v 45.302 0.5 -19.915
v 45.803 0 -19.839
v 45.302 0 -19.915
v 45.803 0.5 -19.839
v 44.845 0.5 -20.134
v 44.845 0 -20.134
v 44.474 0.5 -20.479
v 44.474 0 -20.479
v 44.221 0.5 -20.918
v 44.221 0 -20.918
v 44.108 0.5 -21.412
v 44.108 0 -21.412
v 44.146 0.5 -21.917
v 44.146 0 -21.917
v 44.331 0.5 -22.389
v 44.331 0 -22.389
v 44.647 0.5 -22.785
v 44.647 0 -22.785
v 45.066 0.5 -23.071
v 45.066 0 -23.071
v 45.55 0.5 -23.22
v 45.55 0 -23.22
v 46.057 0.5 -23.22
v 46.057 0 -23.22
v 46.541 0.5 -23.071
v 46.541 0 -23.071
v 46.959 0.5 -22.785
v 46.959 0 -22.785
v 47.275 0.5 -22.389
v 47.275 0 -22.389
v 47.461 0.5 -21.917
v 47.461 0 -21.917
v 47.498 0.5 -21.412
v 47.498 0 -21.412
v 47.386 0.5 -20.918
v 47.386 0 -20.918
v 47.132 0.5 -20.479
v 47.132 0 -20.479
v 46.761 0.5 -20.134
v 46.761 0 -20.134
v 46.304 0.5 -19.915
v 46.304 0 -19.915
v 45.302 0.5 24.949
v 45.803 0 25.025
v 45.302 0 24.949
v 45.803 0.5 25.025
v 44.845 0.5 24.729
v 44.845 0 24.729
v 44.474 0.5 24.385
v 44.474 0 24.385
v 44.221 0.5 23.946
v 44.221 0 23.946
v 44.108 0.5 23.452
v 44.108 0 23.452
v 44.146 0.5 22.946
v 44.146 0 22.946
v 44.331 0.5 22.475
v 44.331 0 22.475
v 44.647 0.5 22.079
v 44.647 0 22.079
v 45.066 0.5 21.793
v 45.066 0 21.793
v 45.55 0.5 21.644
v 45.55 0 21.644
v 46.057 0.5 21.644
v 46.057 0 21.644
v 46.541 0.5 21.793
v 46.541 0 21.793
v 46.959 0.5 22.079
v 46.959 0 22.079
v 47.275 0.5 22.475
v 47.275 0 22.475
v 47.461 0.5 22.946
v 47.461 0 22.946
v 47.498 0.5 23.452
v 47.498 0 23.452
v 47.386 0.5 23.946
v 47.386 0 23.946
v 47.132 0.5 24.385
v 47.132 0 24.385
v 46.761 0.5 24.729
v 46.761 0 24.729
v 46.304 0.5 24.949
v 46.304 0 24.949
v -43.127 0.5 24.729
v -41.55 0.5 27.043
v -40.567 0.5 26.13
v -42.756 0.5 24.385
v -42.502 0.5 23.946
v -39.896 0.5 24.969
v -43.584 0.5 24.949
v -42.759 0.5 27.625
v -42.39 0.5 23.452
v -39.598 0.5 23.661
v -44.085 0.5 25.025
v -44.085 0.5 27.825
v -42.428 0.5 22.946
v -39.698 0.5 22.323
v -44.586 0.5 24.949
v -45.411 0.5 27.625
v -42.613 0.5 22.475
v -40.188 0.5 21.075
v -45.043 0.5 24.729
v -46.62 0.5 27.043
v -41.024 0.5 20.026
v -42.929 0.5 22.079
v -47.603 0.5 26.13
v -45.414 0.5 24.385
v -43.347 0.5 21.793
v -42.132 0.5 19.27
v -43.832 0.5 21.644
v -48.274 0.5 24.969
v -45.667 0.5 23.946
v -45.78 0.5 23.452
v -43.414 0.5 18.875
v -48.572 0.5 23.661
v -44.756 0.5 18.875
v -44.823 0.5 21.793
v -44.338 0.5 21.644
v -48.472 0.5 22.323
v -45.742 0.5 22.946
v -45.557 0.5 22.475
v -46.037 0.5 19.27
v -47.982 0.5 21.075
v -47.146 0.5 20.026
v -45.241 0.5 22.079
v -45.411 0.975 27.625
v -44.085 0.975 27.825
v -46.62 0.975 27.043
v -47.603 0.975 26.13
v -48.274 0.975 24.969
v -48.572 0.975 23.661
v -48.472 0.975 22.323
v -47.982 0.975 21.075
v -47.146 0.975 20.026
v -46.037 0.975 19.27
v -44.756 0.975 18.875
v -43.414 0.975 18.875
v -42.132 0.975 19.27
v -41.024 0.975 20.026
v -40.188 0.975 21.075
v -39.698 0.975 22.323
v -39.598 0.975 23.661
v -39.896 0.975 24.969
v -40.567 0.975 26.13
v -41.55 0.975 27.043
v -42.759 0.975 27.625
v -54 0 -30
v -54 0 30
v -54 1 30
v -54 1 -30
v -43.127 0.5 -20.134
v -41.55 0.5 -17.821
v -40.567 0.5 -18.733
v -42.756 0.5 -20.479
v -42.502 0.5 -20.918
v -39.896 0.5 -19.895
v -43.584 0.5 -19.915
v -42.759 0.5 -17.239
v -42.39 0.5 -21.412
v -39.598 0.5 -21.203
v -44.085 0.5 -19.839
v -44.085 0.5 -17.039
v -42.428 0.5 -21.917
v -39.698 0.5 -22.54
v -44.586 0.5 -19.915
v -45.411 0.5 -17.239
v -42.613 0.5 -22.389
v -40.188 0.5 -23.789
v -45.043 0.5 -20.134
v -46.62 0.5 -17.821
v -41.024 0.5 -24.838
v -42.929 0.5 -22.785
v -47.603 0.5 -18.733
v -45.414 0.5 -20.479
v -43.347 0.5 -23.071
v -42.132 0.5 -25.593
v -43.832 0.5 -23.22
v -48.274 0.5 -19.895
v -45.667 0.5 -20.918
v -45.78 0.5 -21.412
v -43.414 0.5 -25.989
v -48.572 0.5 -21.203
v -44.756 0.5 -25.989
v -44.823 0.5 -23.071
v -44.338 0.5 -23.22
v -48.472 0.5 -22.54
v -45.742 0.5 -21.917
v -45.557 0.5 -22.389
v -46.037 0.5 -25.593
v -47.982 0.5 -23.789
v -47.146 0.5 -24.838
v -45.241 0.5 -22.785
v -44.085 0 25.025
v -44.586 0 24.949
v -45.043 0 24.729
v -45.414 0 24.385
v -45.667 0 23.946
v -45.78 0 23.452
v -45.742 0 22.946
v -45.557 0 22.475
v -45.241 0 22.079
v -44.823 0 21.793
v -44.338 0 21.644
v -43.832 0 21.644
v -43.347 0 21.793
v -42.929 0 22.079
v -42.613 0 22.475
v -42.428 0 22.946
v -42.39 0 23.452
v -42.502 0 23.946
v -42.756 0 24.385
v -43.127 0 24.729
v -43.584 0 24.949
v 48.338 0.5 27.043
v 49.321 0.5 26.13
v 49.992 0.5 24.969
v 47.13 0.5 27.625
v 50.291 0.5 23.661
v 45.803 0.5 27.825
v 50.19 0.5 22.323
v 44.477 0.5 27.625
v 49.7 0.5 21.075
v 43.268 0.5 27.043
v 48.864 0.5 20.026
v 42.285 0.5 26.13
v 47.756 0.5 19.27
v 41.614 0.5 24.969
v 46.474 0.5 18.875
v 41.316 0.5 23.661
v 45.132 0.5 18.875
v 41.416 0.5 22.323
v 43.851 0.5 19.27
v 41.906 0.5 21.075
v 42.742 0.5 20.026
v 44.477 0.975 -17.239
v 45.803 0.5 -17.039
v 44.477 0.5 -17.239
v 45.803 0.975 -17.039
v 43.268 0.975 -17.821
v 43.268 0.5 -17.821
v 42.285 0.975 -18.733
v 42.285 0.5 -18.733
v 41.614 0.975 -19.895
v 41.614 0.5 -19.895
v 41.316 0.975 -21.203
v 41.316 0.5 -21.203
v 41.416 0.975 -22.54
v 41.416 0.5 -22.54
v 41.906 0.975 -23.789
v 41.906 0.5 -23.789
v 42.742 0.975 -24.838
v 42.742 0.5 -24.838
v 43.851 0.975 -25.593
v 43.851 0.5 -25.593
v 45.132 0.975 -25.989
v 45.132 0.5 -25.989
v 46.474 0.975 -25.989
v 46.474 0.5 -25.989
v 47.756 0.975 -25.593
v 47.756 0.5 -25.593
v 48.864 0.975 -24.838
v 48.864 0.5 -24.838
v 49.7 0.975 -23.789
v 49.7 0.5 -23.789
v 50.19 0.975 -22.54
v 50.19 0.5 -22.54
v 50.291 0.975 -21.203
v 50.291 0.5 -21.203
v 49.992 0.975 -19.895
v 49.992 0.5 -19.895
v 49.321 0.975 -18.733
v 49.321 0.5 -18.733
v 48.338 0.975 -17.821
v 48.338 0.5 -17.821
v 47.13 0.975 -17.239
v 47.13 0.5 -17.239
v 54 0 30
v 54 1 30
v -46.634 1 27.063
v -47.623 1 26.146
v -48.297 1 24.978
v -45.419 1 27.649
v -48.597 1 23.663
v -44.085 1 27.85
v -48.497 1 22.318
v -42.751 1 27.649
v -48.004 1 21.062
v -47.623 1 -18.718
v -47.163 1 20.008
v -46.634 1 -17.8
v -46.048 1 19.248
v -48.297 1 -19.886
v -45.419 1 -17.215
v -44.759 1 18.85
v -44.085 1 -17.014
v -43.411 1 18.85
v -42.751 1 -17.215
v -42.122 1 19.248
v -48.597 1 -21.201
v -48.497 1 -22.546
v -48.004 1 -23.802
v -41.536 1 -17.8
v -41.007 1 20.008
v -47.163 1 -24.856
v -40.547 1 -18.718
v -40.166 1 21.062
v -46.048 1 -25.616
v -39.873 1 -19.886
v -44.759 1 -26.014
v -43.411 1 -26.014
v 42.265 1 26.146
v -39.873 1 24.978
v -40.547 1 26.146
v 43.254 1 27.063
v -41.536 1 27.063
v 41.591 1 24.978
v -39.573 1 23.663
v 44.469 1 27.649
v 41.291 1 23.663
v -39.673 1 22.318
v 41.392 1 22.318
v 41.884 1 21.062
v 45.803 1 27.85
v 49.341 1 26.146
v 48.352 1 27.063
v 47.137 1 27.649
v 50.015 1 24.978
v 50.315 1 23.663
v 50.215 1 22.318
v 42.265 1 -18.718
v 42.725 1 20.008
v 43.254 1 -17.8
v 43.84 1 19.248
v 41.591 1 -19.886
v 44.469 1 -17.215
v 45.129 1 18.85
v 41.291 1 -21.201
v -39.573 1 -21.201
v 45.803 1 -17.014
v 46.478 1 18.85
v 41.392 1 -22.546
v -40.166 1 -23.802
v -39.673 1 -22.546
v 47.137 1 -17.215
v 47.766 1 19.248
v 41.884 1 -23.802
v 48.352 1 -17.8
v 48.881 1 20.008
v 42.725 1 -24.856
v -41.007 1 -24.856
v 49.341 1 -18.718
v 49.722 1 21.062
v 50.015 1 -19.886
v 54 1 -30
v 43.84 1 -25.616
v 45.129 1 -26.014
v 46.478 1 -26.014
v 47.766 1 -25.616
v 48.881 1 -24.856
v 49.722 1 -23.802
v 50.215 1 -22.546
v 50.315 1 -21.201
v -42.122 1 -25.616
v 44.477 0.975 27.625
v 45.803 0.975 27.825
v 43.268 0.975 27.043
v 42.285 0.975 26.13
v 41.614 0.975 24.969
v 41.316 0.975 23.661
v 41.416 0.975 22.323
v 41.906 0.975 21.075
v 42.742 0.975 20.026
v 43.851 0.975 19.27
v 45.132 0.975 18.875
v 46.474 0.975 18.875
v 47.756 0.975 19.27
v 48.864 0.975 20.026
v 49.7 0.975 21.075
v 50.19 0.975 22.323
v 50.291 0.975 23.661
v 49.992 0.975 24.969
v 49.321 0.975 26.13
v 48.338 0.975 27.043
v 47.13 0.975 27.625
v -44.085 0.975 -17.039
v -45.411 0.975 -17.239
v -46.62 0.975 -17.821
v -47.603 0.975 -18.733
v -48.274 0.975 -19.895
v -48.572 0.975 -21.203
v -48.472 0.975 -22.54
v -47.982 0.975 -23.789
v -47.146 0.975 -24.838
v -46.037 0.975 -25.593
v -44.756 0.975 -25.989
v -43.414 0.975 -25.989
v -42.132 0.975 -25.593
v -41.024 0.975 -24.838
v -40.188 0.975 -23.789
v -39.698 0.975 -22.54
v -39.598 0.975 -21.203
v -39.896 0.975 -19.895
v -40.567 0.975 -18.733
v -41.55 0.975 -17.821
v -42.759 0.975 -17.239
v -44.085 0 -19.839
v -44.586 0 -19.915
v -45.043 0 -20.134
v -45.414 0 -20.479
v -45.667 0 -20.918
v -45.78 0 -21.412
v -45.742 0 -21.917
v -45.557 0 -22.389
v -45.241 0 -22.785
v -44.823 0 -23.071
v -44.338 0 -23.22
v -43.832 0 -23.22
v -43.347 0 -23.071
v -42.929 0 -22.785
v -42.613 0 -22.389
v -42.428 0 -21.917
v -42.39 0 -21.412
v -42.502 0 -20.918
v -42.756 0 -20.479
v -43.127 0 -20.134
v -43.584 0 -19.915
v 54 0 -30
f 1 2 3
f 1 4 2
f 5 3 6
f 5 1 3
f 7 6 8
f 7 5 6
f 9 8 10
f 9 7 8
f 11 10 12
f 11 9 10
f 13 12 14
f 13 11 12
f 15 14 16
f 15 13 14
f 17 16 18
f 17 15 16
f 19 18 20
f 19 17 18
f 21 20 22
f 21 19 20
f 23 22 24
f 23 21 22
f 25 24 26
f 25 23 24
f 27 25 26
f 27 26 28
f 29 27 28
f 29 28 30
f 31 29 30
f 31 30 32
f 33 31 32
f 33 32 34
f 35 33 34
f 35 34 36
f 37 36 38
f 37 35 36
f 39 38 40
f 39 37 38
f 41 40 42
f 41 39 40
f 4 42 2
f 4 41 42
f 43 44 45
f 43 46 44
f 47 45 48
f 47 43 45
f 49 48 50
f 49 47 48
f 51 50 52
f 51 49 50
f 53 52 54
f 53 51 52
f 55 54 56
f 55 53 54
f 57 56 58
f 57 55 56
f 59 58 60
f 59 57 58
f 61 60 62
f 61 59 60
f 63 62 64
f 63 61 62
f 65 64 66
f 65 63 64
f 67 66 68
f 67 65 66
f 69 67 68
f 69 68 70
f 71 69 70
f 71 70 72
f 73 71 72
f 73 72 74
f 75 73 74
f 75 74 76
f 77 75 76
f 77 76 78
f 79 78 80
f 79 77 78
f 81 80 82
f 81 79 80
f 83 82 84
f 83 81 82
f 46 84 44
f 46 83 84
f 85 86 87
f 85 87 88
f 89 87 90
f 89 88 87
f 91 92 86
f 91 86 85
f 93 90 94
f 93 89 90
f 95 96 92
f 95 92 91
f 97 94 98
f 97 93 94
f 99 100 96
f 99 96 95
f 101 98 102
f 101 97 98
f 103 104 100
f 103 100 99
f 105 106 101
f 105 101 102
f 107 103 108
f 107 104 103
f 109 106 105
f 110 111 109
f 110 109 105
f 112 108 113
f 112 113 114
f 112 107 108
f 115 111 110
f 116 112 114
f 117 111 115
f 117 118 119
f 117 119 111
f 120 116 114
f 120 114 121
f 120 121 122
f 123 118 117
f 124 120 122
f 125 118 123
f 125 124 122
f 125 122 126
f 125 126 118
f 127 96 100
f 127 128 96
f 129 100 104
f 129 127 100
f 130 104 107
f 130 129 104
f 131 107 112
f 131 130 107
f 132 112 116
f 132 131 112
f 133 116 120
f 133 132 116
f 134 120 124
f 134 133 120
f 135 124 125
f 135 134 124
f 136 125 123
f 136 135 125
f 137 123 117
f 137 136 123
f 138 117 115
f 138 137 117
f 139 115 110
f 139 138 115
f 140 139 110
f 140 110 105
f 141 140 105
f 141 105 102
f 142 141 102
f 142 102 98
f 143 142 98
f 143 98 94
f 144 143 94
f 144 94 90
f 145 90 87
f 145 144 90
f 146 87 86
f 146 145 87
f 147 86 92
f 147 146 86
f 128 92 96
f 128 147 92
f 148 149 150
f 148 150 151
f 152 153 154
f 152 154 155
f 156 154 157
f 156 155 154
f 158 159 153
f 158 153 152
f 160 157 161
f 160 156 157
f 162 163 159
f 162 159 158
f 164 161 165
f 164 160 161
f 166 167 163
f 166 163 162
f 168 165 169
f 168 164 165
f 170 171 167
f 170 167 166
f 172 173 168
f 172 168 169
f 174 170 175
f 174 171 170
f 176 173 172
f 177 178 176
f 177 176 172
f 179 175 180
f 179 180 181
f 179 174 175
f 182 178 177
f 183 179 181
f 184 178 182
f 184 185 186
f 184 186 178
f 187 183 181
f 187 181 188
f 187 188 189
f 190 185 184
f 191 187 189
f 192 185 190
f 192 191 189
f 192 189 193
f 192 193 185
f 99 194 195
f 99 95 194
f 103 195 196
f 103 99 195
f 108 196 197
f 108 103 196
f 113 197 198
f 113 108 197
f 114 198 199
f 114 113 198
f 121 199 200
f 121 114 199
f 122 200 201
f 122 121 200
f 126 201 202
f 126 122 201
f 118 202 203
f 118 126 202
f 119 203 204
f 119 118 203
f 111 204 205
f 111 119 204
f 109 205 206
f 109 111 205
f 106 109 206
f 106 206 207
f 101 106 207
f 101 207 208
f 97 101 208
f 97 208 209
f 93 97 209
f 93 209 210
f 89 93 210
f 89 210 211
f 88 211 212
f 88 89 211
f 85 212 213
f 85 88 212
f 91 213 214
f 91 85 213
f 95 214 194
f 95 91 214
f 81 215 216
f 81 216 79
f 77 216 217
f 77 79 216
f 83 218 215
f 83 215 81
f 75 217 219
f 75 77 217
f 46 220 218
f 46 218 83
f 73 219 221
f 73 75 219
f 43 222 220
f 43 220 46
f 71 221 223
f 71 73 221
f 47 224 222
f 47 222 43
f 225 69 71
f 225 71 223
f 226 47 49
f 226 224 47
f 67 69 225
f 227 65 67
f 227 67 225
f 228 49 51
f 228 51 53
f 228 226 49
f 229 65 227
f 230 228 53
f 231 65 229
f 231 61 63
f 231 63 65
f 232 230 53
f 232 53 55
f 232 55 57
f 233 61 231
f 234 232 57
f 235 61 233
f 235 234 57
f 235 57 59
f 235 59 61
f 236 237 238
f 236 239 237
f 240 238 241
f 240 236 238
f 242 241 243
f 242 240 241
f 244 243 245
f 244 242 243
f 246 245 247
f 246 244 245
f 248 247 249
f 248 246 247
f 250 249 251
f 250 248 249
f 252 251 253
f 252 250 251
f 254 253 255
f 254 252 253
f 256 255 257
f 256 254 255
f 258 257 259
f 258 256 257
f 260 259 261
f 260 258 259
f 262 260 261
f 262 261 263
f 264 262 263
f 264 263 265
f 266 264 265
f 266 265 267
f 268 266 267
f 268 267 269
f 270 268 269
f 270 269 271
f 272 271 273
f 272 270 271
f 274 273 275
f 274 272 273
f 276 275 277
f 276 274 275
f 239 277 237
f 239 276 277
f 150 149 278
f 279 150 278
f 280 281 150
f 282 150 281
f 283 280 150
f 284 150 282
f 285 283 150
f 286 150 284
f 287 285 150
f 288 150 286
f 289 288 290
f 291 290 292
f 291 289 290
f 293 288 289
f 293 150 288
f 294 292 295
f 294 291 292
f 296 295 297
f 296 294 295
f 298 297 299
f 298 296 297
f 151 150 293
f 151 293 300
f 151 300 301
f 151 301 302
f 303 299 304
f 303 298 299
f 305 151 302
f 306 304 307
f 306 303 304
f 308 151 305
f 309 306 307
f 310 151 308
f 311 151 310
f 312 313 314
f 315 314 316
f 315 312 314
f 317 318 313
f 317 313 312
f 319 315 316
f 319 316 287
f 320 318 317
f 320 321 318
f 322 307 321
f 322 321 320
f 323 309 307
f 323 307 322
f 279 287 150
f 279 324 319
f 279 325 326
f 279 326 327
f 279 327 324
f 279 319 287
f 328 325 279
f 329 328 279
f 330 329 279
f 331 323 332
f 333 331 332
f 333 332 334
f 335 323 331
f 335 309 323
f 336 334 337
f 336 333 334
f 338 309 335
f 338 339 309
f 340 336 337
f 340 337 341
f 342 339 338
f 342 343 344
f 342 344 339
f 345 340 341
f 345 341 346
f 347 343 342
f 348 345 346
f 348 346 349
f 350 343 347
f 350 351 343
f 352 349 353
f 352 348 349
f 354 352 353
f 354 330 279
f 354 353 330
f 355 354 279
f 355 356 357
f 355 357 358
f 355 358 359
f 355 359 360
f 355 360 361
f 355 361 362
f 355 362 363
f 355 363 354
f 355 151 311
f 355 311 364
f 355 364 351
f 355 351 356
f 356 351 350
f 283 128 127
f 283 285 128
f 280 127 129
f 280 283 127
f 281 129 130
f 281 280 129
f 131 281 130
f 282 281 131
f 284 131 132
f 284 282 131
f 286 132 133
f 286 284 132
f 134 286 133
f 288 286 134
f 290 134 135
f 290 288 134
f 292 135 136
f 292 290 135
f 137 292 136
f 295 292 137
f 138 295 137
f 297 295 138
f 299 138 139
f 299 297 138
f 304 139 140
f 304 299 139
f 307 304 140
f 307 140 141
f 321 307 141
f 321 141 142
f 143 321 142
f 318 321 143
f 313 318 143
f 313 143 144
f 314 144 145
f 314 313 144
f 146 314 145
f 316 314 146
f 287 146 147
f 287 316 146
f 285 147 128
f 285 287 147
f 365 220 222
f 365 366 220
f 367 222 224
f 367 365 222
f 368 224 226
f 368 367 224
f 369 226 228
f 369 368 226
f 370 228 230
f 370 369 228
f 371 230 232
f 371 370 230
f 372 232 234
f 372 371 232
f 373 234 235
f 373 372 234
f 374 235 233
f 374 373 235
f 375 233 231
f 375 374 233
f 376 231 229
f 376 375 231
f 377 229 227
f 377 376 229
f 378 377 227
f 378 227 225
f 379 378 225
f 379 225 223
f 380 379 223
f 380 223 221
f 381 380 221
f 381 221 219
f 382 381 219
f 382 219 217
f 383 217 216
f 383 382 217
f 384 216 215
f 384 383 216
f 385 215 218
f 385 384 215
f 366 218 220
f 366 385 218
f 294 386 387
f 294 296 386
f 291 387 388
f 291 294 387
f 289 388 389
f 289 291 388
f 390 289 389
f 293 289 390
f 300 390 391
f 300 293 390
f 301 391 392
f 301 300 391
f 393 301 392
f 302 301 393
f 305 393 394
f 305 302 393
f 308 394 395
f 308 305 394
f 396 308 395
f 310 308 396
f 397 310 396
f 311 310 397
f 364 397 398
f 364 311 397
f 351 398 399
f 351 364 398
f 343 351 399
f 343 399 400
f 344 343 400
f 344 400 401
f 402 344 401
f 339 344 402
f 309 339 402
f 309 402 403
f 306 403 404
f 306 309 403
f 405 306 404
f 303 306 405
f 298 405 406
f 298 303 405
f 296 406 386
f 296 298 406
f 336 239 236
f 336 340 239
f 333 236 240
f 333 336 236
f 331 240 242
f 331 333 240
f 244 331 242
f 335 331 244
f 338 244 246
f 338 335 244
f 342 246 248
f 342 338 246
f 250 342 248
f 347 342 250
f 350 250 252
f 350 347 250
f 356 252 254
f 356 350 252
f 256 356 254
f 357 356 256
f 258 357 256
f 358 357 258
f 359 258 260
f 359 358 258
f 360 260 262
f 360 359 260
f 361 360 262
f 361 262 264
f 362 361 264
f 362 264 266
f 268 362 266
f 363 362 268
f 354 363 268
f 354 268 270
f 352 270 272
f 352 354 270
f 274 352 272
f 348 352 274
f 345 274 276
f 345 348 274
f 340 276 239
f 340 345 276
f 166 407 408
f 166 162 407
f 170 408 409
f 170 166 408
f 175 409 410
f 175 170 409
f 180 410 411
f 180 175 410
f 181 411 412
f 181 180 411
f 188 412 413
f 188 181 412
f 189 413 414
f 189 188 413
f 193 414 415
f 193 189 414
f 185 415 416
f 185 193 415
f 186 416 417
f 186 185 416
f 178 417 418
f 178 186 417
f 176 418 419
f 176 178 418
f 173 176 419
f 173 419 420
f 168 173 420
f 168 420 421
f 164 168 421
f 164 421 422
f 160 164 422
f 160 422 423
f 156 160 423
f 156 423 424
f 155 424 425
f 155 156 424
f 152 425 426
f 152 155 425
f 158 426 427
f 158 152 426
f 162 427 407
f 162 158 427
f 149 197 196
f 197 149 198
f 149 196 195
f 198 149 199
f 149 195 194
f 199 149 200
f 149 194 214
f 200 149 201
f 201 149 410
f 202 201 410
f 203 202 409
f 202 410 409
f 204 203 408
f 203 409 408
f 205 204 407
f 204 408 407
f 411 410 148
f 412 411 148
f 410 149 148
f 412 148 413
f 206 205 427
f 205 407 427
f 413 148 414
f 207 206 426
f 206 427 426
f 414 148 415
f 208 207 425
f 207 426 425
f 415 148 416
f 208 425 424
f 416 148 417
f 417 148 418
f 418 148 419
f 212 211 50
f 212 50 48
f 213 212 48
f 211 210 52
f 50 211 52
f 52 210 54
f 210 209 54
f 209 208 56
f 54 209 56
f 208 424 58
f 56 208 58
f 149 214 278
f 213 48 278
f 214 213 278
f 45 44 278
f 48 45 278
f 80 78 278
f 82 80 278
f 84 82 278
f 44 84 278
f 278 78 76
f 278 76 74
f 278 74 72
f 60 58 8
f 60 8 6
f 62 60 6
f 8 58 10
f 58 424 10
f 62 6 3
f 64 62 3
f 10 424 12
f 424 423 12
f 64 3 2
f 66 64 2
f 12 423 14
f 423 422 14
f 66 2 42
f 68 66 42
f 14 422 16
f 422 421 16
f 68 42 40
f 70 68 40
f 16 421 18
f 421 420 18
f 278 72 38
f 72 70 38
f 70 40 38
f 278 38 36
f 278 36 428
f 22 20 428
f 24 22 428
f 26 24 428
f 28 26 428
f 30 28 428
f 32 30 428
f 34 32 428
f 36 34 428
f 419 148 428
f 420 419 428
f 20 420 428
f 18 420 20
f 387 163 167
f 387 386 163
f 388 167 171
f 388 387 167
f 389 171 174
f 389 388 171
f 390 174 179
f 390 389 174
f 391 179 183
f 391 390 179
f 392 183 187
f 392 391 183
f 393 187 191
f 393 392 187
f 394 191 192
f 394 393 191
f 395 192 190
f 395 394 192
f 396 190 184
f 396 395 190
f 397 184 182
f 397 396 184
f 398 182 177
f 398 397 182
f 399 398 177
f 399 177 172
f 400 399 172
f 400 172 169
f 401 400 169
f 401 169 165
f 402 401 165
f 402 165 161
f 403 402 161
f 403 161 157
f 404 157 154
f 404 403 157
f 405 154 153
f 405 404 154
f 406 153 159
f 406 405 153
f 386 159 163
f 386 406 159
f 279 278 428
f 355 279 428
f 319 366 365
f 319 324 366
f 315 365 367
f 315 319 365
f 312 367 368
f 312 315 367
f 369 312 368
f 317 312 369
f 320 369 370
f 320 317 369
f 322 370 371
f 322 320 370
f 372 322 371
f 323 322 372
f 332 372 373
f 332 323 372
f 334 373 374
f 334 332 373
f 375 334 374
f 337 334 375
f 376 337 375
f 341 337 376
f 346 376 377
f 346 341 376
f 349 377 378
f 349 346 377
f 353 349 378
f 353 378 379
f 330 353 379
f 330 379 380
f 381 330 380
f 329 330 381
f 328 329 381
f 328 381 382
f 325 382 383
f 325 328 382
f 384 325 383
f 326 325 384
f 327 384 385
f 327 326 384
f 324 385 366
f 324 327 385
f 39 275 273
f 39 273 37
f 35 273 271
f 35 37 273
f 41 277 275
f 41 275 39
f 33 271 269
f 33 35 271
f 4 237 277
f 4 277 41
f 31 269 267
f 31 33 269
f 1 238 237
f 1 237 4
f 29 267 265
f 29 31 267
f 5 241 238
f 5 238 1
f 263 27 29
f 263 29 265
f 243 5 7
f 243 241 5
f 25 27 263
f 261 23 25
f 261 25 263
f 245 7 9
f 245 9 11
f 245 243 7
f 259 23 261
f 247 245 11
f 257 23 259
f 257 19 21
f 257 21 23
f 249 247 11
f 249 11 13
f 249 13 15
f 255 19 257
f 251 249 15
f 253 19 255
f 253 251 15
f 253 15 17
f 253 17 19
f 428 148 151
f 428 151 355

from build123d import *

# Parameters (mm, degrees)
SKETCH_2_W                  = 108
SKETCH_2_H                  = 60
EXTRUDE_1_DEPTH             = 1
HOLE_WIZARD_M3_1_AT_2_COUNT = 2
HOLE_WIZARD_M3_1_AT_2_PITCH = 89.888096236
HOLE_WIZARD_M3_1_AT_3_COUNT = 2
HOLE_WIZARD_M3_1_AT_3_PITCH = 44.863801861
HOLE_WIZARD_M3_1_AT_4_COUNT = 2
HOLE_WIZARD_M3_1_AT_4_PITCH = 100.462085198


with BuildPart() as part:
    # 草图2 → 凸台-拉伸1 (new body)
    with BuildSketch(Plane(origin=(0, 0, 0), x_dir=(1, 0, 0), z_dir=(0, 1, 0))):
        Rectangle(SKETCH_2_W, SKETCH_2_H)
    extrude(amount=EXTRUDE_1_DEPTH)

    # 草图4 → M3 六角头螺栓的柱形沉头孔1 (revolve, cut)
    with BuildSketch(Plane(origin=(-44.084962343, 1, -21.539091549), x_dir=(0, 0, 1), z_dir=(1, 0, 0))):
        Polygon((0, 0), (0, 1), (1.7, 1), (1.7, 0.5), (4.5, 0.5), (4.5, 0.025), (4.525, 0), align=None)
    hole_wizard_m3_1 = revolve(axis=Axis((-44.084962343, 7.35, -21.539091549), (0, -1, 0)), mode=Mode.SUBTRACT)

    # M3 六角头螺栓的柱形沉头孔1 at 2: M3 六角头螺栓的柱形沉头孔1 ×2
    with Locations(*[(i * HOLE_WIZARD_M3_1_AT_2_PITCH, 0, 0) for i in range(1, HOLE_WIZARD_M3_1_AT_2_COUNT)]):
        add(hole_wizard_m3_1, mode=Mode.SUBTRACT)

    # M3 六角头螺栓的柱形沉头孔1 at 3: M3 六角头螺栓的柱形沉头孔1 ×2
    with Locations(*[(0, 0, i * HOLE_WIZARD_M3_1_AT_3_PITCH) for i in range(1, HOLE_WIZARD_M3_1_AT_3_COUNT)]):
        add(hole_wizard_m3_1, mode=Mode.SUBTRACT)

    # M3 六角头螺栓的柱形沉头孔1 at 4: M3 六角头螺栓的柱形沉头孔1 ×2
    with Locations(*[Vector(0.894746471, 0, 0.446574464) * (i * HOLE_WIZARD_M3_1_AT_4_PITCH) for i in range(1, HOLE_WIZARD_M3_1_AT_4_COUNT)]):
        add(hole_wizard_m3_1, mode=Mode.SUBTRACT)


solid = part.part
